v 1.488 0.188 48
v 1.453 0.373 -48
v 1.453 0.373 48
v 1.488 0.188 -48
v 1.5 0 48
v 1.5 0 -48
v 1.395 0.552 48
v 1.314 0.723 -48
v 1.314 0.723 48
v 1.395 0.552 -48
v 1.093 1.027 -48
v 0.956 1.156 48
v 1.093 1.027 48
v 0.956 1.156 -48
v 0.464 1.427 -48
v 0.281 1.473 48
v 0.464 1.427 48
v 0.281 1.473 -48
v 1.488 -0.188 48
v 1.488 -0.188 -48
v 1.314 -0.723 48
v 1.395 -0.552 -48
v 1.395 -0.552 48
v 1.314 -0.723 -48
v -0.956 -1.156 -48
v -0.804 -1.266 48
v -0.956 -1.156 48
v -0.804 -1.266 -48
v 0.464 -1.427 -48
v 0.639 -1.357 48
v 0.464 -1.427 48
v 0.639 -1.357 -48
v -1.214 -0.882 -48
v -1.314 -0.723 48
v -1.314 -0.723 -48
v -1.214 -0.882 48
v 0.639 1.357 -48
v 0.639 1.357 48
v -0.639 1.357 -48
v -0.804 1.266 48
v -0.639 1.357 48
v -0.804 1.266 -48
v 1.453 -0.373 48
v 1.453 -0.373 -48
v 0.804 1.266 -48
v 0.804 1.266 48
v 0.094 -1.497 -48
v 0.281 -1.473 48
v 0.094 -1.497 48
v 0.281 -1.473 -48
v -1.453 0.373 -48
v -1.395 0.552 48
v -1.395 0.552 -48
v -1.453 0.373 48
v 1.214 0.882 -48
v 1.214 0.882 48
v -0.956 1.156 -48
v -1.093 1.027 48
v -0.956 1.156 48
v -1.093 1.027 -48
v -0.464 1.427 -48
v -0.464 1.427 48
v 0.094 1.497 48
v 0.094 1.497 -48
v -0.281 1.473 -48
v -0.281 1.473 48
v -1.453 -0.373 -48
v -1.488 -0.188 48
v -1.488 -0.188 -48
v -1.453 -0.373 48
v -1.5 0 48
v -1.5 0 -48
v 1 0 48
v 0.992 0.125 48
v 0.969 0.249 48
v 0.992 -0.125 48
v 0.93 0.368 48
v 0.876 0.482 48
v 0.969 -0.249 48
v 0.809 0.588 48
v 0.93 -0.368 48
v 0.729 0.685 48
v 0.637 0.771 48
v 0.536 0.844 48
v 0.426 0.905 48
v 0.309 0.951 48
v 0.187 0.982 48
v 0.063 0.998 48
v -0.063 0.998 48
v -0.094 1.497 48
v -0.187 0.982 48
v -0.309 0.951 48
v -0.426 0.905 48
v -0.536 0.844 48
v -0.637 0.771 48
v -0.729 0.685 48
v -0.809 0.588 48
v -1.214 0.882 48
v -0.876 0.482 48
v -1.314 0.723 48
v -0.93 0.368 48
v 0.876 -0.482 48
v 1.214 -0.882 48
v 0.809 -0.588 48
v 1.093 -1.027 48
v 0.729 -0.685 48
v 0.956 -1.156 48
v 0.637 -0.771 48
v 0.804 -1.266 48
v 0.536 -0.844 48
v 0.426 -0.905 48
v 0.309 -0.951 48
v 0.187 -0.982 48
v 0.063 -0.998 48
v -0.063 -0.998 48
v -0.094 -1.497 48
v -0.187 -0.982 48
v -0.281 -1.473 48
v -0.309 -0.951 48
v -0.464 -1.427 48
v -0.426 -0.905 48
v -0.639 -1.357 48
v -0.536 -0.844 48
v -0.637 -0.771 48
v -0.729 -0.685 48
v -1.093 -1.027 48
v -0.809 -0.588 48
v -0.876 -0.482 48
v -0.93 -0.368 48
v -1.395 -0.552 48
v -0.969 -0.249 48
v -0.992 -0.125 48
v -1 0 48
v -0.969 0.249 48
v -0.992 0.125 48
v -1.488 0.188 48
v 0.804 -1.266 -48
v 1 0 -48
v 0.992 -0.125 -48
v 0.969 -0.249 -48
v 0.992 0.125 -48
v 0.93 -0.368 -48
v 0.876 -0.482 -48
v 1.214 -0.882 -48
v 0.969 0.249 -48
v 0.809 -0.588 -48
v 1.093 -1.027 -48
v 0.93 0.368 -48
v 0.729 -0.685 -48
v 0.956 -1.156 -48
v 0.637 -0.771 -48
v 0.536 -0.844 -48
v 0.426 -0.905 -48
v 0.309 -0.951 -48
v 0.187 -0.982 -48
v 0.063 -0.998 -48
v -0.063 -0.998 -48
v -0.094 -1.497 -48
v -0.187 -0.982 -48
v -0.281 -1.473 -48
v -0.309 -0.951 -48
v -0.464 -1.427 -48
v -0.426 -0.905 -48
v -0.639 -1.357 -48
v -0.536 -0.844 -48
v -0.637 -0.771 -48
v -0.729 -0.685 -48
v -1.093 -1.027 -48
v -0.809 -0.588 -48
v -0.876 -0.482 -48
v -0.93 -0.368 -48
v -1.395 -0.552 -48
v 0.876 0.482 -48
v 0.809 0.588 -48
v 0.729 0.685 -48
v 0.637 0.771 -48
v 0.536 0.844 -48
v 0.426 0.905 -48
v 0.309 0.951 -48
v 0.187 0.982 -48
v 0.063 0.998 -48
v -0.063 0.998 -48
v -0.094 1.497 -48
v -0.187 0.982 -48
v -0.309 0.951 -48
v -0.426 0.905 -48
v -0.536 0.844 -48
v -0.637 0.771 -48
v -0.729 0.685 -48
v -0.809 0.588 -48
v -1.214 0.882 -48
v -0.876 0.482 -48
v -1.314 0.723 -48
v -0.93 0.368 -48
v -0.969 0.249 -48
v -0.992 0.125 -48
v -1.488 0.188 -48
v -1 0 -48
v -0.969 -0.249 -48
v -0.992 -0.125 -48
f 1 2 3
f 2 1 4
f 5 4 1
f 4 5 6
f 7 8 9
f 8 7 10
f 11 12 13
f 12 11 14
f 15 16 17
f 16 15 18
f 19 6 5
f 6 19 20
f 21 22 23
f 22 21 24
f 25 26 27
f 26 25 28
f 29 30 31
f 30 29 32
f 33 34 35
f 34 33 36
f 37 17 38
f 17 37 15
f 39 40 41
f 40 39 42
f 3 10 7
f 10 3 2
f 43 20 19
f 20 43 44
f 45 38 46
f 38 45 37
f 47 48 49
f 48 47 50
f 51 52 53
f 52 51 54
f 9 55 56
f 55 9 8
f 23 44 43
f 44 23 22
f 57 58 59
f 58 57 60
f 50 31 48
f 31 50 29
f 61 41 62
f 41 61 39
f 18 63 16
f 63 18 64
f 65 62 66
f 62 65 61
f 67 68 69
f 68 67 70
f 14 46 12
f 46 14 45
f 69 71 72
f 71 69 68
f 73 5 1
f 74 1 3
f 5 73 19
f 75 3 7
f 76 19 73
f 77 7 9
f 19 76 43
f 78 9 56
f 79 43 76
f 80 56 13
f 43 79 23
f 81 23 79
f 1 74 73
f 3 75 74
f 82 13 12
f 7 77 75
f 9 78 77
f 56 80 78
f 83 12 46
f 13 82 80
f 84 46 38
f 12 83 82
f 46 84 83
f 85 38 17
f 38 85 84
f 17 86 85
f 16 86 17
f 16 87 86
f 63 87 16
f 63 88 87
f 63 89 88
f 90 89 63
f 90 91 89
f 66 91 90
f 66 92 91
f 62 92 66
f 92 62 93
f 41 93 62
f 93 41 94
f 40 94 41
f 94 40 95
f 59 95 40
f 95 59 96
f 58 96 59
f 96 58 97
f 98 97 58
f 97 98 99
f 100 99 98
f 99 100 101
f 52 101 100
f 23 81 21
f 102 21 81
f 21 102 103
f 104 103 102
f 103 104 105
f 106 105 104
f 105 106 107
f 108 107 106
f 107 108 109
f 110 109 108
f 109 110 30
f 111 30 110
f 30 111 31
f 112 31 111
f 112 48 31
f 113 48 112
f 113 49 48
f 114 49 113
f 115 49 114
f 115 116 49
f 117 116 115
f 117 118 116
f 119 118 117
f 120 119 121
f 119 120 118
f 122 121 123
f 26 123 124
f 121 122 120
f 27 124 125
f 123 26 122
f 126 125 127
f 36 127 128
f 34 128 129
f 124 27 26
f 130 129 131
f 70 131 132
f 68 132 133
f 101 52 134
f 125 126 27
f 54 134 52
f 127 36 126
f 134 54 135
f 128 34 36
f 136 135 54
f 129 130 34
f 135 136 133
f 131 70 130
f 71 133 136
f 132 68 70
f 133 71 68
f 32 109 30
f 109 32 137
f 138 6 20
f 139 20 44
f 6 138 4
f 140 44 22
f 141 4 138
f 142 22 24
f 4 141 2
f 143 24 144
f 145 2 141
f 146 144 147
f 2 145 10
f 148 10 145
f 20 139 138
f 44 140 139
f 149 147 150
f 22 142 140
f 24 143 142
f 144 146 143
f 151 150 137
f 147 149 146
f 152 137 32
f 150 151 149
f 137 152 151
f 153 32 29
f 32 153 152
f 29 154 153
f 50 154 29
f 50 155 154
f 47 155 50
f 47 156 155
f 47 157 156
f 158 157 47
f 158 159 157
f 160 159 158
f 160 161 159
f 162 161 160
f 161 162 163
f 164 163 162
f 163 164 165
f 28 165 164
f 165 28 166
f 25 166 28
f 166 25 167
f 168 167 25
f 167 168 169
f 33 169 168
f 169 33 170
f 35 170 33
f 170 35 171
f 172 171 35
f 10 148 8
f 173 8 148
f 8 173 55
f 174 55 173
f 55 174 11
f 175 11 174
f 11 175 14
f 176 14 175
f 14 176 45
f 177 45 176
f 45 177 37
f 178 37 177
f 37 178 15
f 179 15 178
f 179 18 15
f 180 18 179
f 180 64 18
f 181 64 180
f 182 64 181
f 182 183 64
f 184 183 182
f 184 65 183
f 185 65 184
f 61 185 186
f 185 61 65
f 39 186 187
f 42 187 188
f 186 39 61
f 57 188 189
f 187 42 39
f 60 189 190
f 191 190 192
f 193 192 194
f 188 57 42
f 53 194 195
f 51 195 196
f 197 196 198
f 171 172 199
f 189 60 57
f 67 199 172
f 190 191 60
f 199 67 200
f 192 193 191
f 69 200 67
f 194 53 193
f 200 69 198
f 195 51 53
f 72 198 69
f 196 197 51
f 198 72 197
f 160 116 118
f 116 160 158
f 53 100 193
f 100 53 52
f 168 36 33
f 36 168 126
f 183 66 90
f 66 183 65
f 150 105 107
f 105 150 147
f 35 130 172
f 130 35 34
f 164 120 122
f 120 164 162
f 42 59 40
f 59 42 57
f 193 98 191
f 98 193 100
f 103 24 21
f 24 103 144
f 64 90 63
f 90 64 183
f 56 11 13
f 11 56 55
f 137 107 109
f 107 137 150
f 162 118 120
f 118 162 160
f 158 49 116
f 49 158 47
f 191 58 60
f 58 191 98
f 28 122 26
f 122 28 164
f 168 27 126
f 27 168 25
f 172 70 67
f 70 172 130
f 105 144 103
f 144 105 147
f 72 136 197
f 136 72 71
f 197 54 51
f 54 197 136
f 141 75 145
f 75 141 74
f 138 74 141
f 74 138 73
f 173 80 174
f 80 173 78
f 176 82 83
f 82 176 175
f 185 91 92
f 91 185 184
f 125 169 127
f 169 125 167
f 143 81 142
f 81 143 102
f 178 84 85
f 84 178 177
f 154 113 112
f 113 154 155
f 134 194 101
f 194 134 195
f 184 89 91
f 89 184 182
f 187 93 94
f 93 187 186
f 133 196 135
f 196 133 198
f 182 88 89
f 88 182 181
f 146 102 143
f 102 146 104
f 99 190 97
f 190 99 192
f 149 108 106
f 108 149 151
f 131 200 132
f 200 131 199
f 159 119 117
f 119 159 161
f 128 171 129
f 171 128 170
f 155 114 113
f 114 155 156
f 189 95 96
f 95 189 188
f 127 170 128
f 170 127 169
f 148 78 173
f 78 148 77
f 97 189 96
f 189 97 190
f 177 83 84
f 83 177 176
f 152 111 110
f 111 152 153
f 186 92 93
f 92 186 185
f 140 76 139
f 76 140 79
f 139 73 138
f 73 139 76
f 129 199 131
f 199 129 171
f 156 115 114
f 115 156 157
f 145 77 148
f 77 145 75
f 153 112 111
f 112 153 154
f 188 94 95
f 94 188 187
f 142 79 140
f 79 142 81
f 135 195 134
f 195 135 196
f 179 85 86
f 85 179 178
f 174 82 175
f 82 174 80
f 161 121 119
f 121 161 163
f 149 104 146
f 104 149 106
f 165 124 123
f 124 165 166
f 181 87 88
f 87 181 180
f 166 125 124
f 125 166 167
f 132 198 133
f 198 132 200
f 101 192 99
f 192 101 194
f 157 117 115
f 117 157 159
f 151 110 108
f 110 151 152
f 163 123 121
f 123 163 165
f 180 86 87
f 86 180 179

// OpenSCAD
$fn = 50;


difference() {
	union() {
		translate(v = [0, 0, -48.0000000000]) {
			cylinder(h = 96, r = 1.5000000000);
		}
	}
	union() {
		translate(v = [0, 0, -100.0000000000]) {
			cylinder(h = 200, r = 1.0000000000);
		}
	}
}
